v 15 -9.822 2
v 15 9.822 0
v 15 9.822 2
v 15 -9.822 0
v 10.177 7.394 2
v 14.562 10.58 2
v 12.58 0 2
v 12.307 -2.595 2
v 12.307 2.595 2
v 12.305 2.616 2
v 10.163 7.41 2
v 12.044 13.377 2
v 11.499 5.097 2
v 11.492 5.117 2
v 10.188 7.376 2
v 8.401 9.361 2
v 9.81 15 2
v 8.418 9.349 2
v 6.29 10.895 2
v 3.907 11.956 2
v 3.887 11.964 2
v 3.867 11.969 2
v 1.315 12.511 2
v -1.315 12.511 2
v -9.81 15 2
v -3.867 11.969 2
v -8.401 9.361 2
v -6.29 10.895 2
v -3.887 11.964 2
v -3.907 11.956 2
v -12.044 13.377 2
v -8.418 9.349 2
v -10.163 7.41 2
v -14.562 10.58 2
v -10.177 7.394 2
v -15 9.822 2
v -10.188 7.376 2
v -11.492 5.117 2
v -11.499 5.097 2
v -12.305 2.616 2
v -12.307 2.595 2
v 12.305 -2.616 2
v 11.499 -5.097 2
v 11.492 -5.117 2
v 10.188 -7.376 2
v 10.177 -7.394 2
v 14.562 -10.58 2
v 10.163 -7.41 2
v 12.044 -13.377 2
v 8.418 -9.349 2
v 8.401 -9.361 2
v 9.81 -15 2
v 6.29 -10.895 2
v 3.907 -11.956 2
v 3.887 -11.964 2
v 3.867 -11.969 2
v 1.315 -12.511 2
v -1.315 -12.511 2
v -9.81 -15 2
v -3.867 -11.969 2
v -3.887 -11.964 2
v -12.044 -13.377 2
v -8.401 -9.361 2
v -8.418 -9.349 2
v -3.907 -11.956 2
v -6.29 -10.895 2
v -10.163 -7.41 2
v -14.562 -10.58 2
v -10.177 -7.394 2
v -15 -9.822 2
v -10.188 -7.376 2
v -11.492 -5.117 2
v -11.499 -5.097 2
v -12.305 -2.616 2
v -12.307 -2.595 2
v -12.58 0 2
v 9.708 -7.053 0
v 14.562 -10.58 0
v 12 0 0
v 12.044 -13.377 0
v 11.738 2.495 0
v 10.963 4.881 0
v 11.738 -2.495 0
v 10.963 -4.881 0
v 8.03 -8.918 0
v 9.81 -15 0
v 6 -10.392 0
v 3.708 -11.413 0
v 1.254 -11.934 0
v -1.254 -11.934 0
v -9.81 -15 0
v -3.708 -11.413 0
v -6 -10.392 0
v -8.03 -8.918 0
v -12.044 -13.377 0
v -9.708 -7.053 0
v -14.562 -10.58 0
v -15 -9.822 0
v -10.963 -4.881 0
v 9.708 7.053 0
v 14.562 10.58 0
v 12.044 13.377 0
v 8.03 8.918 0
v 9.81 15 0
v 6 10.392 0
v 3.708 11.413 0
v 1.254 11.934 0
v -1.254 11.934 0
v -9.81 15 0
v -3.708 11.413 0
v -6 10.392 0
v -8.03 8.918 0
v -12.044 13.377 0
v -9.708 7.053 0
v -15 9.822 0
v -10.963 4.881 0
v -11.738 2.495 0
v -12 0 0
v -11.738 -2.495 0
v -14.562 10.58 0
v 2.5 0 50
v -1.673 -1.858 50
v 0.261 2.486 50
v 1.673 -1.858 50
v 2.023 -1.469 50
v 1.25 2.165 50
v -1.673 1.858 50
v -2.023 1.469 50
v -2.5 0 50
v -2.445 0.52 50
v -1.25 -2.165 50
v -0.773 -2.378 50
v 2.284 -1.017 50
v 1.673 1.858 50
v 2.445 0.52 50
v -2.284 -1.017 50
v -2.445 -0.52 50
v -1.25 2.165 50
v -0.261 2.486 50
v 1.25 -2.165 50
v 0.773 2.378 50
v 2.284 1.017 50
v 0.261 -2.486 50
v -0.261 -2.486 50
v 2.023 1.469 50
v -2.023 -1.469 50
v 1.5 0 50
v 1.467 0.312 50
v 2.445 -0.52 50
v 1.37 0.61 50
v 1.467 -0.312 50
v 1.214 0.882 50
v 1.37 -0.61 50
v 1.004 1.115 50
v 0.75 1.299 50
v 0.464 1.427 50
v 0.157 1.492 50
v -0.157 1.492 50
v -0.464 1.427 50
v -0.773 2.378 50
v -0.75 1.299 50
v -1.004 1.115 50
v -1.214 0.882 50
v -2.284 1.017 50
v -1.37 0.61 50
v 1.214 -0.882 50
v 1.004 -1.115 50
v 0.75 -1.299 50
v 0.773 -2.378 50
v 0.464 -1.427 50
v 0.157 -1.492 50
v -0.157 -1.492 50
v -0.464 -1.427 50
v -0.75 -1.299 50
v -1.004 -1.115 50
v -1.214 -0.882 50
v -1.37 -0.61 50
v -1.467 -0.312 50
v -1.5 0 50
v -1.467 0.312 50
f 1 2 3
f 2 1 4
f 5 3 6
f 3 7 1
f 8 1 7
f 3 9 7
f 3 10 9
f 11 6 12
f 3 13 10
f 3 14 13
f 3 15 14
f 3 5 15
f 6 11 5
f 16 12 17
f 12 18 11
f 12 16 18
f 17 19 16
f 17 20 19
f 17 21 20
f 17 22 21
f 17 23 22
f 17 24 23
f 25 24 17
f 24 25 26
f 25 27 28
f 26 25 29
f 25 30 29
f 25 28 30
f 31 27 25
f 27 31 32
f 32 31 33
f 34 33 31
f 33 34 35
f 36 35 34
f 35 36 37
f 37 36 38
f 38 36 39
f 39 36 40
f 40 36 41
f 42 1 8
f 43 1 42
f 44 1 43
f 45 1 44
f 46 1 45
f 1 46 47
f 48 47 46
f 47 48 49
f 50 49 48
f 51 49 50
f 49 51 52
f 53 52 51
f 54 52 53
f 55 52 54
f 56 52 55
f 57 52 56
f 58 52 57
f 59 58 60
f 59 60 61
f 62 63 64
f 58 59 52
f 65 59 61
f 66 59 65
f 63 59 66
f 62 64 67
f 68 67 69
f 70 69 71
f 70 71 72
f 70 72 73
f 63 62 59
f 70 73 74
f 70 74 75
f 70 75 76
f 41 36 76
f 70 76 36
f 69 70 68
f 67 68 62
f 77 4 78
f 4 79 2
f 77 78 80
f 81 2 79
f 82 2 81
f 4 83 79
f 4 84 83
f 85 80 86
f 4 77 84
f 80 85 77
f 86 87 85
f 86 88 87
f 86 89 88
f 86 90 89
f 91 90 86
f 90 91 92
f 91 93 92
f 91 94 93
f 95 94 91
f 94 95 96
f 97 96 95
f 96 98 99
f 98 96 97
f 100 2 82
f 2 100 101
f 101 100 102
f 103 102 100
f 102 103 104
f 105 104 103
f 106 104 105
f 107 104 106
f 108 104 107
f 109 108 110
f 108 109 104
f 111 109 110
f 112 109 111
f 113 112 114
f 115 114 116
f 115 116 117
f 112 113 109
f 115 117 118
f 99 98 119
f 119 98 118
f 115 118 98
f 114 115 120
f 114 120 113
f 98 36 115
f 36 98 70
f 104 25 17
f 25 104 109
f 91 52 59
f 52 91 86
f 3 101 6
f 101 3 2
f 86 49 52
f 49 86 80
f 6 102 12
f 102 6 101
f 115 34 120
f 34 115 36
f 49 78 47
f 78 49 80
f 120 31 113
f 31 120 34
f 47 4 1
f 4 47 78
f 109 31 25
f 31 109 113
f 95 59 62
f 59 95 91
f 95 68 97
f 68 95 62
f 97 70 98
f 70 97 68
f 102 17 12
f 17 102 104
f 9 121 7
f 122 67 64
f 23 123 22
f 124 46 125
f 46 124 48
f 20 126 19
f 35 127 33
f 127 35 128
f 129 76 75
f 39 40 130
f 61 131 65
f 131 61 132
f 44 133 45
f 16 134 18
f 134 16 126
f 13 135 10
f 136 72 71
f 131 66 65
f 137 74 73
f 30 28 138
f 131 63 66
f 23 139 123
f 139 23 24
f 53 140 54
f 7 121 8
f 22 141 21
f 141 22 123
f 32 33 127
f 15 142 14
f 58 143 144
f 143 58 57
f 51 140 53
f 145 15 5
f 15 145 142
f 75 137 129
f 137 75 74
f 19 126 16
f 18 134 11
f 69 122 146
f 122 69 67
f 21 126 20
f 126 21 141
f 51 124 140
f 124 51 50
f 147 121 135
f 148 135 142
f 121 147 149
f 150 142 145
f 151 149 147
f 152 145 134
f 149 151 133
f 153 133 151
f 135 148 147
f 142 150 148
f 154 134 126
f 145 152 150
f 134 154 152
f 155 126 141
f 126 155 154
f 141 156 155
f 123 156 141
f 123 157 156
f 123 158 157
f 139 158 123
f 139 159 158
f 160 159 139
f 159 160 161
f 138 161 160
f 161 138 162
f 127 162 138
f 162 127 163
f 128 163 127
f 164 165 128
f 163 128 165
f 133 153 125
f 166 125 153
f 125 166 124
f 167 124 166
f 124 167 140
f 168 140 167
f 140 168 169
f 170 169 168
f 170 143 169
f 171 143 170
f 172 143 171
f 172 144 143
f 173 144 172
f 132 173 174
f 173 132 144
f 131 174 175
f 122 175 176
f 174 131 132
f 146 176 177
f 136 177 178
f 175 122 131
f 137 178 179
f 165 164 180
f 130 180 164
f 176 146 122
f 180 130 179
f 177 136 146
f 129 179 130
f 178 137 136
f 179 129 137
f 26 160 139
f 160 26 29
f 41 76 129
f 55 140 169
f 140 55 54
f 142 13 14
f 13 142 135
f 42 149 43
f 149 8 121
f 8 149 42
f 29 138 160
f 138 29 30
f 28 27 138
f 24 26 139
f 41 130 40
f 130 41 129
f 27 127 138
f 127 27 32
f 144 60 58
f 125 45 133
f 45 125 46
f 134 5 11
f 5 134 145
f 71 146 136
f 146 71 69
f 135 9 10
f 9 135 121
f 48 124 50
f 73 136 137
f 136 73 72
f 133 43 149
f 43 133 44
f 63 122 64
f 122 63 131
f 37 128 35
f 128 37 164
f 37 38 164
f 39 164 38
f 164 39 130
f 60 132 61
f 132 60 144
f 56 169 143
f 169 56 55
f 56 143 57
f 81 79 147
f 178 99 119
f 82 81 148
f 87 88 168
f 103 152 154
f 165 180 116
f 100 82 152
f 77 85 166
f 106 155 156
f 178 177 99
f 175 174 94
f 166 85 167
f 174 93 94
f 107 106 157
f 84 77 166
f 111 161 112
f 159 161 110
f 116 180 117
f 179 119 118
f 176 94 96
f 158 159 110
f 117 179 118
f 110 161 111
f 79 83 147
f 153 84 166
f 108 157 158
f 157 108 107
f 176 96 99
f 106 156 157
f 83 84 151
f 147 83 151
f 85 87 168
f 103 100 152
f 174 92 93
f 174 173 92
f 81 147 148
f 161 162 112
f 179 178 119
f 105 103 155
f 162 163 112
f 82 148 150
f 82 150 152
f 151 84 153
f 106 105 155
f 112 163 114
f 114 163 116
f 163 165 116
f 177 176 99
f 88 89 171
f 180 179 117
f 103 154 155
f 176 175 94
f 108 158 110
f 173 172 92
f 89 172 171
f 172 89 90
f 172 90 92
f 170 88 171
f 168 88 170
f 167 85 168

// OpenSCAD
height = 50;
base_width = 30;
top_width = 5;
base_height = 2;
wall_thickness = 1;

difference() {
    union() {
        intersection() {
            translate([-base_width/2,-base_width/2,0]) cube([base_width,base_width,base_height]);
            cylinder(r=0.6*base_width,h=base_height);
        }
        cylinder(r1=base_width/2-2*wall_thickness, r2=top_width/2, h=height);
    }
    cylinder(r1=base_width/2-3*wall_thickness, r2=top_width/2-wall_thickness, h=height);
}
